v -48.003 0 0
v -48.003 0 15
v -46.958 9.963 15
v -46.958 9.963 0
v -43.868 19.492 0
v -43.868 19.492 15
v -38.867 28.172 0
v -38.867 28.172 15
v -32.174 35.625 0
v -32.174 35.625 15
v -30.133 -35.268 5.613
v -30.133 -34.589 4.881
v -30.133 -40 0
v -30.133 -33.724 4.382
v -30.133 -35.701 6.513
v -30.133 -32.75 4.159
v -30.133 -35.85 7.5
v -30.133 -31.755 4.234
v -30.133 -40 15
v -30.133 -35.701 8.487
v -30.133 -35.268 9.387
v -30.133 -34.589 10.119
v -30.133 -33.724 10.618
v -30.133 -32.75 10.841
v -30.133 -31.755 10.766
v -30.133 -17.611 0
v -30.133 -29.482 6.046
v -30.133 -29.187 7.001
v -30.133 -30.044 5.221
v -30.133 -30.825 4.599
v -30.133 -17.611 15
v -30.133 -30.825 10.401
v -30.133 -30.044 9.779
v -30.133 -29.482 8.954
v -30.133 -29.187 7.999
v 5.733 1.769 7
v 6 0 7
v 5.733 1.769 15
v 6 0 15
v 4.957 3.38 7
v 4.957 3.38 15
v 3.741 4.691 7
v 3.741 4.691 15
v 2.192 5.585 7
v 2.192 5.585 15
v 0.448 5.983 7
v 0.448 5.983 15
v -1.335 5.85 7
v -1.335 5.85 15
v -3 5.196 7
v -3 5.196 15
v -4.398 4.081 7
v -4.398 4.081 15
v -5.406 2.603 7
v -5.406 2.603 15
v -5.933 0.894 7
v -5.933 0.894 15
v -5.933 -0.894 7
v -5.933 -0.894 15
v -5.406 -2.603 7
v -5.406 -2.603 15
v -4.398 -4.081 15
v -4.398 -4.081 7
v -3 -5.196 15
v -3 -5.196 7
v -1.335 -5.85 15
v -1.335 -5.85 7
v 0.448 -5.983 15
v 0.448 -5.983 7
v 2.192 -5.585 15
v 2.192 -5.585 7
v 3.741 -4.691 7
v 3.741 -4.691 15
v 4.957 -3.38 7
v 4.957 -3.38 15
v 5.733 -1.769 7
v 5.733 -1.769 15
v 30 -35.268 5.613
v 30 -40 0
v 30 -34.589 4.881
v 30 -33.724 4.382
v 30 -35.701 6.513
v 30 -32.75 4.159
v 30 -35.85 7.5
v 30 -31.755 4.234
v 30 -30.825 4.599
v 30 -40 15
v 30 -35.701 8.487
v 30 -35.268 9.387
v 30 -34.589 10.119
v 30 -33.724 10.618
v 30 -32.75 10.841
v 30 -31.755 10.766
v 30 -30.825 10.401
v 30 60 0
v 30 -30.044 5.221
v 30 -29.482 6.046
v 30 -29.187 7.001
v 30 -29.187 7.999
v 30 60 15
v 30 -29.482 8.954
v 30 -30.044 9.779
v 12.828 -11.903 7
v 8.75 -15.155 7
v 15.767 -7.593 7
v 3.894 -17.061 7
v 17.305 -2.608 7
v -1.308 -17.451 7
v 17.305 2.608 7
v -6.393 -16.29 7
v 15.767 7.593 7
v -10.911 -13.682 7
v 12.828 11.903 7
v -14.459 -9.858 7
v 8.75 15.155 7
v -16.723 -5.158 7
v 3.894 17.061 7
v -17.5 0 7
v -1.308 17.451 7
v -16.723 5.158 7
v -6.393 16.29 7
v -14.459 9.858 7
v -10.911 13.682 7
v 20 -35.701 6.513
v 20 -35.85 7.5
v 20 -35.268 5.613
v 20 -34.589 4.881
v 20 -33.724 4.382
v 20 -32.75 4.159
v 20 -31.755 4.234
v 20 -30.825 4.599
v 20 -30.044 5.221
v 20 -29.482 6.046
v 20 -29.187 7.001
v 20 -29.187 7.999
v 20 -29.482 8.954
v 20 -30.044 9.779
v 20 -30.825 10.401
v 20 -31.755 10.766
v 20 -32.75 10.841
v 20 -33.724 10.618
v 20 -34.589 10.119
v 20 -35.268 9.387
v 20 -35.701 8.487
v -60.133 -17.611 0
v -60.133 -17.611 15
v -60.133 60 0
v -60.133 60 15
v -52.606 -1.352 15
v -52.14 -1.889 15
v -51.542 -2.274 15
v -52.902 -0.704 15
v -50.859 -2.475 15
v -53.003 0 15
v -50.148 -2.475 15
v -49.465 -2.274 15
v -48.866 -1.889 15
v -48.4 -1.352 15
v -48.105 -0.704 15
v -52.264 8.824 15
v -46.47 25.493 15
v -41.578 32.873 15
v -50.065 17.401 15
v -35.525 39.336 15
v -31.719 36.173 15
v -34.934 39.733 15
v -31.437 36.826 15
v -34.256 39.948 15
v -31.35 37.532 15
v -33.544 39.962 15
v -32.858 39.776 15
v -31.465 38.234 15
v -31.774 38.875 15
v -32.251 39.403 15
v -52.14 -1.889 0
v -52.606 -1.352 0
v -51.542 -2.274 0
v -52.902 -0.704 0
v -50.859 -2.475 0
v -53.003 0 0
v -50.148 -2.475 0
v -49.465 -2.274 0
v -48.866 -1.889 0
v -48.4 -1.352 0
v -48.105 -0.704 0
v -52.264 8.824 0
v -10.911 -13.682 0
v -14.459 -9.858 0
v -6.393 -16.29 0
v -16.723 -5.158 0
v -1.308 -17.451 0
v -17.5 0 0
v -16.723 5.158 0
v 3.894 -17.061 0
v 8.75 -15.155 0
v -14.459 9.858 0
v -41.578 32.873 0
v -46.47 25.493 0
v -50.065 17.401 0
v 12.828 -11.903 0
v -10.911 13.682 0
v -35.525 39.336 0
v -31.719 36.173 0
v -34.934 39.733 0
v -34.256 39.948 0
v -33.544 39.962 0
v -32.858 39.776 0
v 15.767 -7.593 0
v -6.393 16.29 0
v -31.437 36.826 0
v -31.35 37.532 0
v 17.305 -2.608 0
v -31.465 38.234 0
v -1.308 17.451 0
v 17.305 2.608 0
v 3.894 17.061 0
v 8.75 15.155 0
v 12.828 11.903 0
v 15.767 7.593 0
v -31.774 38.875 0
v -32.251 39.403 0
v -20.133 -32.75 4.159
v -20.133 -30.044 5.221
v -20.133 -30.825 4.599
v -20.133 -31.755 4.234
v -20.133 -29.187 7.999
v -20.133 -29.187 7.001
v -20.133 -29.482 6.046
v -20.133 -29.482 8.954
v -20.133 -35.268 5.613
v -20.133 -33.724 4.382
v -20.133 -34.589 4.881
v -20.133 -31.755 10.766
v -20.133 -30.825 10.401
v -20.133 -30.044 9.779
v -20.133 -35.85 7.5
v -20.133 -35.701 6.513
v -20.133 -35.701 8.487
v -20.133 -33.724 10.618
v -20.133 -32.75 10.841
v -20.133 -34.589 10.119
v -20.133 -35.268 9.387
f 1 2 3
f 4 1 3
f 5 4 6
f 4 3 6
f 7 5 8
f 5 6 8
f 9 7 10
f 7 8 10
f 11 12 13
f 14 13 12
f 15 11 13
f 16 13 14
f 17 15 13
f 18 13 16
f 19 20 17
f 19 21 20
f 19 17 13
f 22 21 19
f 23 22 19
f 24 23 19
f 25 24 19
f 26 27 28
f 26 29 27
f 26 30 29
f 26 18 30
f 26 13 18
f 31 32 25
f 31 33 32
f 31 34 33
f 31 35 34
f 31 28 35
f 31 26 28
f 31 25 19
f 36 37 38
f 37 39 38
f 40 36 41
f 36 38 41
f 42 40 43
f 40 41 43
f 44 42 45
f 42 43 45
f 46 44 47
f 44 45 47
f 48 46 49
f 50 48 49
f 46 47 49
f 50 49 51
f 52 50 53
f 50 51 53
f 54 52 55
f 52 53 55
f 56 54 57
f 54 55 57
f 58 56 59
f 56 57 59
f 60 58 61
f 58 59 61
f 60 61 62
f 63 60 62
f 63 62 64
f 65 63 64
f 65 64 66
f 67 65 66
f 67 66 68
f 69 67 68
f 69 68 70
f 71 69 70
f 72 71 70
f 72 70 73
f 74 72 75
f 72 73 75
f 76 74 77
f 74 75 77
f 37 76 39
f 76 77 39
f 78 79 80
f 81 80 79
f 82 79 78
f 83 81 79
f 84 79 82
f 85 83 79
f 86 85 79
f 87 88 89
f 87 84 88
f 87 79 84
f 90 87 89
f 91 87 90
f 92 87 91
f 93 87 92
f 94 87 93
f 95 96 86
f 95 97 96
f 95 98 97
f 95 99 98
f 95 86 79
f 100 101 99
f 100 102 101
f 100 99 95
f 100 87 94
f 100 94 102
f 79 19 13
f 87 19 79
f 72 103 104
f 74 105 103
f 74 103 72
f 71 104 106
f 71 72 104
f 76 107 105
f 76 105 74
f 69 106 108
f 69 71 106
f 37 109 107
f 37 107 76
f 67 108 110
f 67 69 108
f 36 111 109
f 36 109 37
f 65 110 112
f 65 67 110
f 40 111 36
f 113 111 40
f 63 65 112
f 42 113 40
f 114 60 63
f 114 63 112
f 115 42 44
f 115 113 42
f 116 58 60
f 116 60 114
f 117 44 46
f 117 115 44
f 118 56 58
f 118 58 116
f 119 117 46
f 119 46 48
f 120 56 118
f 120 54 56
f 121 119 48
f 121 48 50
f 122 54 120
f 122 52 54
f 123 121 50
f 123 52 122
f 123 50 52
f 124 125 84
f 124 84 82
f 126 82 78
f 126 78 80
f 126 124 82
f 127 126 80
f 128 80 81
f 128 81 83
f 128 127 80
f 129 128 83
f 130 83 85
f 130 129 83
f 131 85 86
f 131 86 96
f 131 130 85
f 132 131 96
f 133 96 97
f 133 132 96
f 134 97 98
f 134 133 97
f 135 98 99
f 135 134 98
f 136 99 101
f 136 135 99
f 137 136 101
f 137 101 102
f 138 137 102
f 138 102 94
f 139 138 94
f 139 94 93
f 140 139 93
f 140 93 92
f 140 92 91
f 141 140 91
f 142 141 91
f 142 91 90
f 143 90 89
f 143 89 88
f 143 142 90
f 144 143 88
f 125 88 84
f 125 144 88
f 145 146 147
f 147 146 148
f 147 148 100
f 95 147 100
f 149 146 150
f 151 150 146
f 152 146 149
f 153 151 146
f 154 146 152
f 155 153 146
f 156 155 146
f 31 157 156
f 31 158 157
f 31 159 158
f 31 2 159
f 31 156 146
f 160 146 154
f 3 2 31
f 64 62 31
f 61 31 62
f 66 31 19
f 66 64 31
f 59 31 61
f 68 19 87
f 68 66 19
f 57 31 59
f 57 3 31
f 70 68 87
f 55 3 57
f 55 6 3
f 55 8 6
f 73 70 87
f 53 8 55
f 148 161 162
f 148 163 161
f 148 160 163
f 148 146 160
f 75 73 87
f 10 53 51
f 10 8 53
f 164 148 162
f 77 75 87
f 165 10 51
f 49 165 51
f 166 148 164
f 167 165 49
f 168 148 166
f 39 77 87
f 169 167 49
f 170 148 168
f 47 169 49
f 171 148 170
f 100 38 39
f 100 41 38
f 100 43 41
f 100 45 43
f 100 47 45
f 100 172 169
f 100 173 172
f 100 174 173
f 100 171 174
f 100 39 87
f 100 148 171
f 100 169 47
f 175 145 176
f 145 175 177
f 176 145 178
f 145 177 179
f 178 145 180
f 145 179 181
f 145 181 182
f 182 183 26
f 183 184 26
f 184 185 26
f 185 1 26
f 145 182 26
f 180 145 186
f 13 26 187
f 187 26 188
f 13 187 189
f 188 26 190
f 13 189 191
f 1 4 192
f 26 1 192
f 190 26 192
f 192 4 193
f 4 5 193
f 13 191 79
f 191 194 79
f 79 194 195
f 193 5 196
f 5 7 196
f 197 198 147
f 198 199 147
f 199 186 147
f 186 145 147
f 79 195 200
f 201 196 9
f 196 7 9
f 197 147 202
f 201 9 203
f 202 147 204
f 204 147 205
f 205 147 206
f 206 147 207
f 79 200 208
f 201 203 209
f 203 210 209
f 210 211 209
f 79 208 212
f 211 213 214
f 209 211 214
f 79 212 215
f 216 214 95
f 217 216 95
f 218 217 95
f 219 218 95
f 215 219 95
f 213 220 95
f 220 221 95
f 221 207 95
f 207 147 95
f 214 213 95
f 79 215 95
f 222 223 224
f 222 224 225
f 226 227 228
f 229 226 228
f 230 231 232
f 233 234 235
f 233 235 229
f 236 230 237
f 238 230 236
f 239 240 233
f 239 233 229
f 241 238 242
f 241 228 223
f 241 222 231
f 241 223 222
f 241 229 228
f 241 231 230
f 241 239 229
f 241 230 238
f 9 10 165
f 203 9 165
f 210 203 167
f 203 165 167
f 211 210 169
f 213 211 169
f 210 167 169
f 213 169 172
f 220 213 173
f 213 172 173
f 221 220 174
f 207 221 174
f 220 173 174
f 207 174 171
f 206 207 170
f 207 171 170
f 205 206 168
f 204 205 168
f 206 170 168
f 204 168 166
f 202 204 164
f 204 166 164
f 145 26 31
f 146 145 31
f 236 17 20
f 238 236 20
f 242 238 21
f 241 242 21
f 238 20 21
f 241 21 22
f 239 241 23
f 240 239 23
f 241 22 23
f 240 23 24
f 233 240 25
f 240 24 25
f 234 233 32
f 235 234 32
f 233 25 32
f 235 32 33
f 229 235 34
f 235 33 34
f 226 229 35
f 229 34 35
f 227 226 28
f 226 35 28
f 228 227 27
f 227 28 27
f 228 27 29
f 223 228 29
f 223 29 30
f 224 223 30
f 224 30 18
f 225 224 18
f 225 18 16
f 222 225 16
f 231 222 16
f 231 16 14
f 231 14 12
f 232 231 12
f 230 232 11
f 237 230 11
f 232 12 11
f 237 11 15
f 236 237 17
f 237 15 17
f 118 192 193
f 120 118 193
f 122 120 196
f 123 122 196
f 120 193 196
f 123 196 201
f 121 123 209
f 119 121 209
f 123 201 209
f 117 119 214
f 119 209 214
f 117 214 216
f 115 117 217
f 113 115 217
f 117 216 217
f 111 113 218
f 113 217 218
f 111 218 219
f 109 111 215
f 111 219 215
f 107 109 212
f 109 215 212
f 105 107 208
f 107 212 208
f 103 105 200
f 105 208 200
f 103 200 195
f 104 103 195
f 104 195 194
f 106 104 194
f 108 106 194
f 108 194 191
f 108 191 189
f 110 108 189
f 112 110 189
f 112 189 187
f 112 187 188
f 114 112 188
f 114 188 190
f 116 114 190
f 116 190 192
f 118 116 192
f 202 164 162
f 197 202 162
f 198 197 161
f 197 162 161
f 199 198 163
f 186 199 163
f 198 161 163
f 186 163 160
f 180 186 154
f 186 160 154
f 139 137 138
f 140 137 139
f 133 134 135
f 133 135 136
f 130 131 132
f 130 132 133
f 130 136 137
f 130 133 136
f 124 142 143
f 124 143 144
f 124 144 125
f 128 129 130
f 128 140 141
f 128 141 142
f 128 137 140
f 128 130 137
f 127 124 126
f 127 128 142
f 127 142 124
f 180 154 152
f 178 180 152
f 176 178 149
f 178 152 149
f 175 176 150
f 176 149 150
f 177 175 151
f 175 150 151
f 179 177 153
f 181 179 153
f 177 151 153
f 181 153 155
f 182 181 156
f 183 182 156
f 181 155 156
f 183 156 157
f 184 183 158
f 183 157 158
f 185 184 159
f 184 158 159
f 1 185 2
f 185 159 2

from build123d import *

# Parameters (mm, degrees)
SKETCH_1_W                   = 90.133378614
SKETCH_1_H                   = 100
EXTRUDE_1_DEPTH              = 15
HOLE_WIZARD_M101_D           = 12
HOLE_WIZARD_M101_CBORE_D     = 35
HOLE_WIZARD_M101_CBORE_DEPTH = 7
SKETCH_10_W                  = 15
SKETCH_10_H                  = 22.389140256
CUT_EXTRUDE_3_DEPTH          = 30
SKETCH_12_R                  = 3.35
CUT_EXTRUDE_4_DEPTH          = 10
CUT_EXTRUDE_START            = -10
SKETCH_14_R                  = 3.35
CUT_EXTRUDE_5_DEPTH          = 10
CUT_EXTRUDE_6_DEPTH          = 87.261365764


with BuildPart() as part:
    # Эскиз1 → Бобышка-Вытянуть1 (new body)
    with BuildSketch(Plane.XY.offset(15)):
        with Locations((-15.066689307, 10)):
            Rectangle(SKETCH_1_W, SKETCH_1_H)
    extrude(amount=-EXTRUDE_1_DEPTH)

    # Цековка для  болта с шестигранной головкой M101 (through all)
    with Locations(Plane(origin=(0, 0, 0), x_dir=(-1, 0, 0), z_dir=(0, 0, -1))):
        with Locations((0, 0)):
            CounterBoreHole(HOLE_WIZARD_M101_D / 2, HOLE_WIZARD_M101_CBORE_D / 2, HOLE_WIZARD_M101_CBORE_DEPTH)

    # Эскиз10 → Вырез-Вытянуть3 (cut)
    with BuildSketch(Plane.ZY.offset(60.133378614)):
        with Locations((7.5, -28.805429872)):
            Rectangle(SKETCH_10_W, SKETCH_10_H)
    extrude(amount=-CUT_EXTRUDE_3_DEPTH, mode=Mode.SUBTRACT)

    # Эскиз12 → Вырез-Вытянуть4 (cut)
    with BuildSketch(Plane.ZY.offset(30.133378614)):
        with Locations(Location((7.5, -32.5, 0), (0, 0, 270))):
            Circle(SKETCH_12_R)
    extrude(amount=-CUT_EXTRUDE_4_DEPTH, mode=Mode.SUBTRACT)

    # Эскиз14 → Вырез-Вытянуть5 (cut)
    with BuildSketch(Plane(origin=(30, 0, 0), x_dir=(0, 0, -1), z_dir=(1, 0, 0)).offset(CUT_EXTRUDE_START)):
        with Locations(Location((-7.5, -32.5, 0), (0, 0, 270))):
            Circle(SKETCH_14_R)
    extrude(amount=CUT_EXTRUDE_5_DEPTH, mode=Mode.SUBTRACT)

    # Эскиз18 → Вырез-Вытянуть6 (cut, through all)
    with BuildSketch(Plane.XY.offset(15)):
        with BuildLine():
            ThreePointArc((-35.524835884, 39.336218188), (-48.437001879, 21.522287864), (-53.003320895, 0))
            ThreePointArc((-53.003320895, 0), (-50.503320895, -2.5), (-48.003320895, 0))
            ThreePointArc((-48.003320895, 0), (-43.867759701, 19.492010563), (-32.173646253, 35.625486717))
            ThreePointArc((-32.173646253, 35.625486717), (-31.993875333, 39.156447268), (-35.524835884, 39.336218188))
        make_face()
    extrude(amount=-CUT_EXTRUDE_6_DEPTH, mode=Mode.SUBTRACT)


solid = part.part
